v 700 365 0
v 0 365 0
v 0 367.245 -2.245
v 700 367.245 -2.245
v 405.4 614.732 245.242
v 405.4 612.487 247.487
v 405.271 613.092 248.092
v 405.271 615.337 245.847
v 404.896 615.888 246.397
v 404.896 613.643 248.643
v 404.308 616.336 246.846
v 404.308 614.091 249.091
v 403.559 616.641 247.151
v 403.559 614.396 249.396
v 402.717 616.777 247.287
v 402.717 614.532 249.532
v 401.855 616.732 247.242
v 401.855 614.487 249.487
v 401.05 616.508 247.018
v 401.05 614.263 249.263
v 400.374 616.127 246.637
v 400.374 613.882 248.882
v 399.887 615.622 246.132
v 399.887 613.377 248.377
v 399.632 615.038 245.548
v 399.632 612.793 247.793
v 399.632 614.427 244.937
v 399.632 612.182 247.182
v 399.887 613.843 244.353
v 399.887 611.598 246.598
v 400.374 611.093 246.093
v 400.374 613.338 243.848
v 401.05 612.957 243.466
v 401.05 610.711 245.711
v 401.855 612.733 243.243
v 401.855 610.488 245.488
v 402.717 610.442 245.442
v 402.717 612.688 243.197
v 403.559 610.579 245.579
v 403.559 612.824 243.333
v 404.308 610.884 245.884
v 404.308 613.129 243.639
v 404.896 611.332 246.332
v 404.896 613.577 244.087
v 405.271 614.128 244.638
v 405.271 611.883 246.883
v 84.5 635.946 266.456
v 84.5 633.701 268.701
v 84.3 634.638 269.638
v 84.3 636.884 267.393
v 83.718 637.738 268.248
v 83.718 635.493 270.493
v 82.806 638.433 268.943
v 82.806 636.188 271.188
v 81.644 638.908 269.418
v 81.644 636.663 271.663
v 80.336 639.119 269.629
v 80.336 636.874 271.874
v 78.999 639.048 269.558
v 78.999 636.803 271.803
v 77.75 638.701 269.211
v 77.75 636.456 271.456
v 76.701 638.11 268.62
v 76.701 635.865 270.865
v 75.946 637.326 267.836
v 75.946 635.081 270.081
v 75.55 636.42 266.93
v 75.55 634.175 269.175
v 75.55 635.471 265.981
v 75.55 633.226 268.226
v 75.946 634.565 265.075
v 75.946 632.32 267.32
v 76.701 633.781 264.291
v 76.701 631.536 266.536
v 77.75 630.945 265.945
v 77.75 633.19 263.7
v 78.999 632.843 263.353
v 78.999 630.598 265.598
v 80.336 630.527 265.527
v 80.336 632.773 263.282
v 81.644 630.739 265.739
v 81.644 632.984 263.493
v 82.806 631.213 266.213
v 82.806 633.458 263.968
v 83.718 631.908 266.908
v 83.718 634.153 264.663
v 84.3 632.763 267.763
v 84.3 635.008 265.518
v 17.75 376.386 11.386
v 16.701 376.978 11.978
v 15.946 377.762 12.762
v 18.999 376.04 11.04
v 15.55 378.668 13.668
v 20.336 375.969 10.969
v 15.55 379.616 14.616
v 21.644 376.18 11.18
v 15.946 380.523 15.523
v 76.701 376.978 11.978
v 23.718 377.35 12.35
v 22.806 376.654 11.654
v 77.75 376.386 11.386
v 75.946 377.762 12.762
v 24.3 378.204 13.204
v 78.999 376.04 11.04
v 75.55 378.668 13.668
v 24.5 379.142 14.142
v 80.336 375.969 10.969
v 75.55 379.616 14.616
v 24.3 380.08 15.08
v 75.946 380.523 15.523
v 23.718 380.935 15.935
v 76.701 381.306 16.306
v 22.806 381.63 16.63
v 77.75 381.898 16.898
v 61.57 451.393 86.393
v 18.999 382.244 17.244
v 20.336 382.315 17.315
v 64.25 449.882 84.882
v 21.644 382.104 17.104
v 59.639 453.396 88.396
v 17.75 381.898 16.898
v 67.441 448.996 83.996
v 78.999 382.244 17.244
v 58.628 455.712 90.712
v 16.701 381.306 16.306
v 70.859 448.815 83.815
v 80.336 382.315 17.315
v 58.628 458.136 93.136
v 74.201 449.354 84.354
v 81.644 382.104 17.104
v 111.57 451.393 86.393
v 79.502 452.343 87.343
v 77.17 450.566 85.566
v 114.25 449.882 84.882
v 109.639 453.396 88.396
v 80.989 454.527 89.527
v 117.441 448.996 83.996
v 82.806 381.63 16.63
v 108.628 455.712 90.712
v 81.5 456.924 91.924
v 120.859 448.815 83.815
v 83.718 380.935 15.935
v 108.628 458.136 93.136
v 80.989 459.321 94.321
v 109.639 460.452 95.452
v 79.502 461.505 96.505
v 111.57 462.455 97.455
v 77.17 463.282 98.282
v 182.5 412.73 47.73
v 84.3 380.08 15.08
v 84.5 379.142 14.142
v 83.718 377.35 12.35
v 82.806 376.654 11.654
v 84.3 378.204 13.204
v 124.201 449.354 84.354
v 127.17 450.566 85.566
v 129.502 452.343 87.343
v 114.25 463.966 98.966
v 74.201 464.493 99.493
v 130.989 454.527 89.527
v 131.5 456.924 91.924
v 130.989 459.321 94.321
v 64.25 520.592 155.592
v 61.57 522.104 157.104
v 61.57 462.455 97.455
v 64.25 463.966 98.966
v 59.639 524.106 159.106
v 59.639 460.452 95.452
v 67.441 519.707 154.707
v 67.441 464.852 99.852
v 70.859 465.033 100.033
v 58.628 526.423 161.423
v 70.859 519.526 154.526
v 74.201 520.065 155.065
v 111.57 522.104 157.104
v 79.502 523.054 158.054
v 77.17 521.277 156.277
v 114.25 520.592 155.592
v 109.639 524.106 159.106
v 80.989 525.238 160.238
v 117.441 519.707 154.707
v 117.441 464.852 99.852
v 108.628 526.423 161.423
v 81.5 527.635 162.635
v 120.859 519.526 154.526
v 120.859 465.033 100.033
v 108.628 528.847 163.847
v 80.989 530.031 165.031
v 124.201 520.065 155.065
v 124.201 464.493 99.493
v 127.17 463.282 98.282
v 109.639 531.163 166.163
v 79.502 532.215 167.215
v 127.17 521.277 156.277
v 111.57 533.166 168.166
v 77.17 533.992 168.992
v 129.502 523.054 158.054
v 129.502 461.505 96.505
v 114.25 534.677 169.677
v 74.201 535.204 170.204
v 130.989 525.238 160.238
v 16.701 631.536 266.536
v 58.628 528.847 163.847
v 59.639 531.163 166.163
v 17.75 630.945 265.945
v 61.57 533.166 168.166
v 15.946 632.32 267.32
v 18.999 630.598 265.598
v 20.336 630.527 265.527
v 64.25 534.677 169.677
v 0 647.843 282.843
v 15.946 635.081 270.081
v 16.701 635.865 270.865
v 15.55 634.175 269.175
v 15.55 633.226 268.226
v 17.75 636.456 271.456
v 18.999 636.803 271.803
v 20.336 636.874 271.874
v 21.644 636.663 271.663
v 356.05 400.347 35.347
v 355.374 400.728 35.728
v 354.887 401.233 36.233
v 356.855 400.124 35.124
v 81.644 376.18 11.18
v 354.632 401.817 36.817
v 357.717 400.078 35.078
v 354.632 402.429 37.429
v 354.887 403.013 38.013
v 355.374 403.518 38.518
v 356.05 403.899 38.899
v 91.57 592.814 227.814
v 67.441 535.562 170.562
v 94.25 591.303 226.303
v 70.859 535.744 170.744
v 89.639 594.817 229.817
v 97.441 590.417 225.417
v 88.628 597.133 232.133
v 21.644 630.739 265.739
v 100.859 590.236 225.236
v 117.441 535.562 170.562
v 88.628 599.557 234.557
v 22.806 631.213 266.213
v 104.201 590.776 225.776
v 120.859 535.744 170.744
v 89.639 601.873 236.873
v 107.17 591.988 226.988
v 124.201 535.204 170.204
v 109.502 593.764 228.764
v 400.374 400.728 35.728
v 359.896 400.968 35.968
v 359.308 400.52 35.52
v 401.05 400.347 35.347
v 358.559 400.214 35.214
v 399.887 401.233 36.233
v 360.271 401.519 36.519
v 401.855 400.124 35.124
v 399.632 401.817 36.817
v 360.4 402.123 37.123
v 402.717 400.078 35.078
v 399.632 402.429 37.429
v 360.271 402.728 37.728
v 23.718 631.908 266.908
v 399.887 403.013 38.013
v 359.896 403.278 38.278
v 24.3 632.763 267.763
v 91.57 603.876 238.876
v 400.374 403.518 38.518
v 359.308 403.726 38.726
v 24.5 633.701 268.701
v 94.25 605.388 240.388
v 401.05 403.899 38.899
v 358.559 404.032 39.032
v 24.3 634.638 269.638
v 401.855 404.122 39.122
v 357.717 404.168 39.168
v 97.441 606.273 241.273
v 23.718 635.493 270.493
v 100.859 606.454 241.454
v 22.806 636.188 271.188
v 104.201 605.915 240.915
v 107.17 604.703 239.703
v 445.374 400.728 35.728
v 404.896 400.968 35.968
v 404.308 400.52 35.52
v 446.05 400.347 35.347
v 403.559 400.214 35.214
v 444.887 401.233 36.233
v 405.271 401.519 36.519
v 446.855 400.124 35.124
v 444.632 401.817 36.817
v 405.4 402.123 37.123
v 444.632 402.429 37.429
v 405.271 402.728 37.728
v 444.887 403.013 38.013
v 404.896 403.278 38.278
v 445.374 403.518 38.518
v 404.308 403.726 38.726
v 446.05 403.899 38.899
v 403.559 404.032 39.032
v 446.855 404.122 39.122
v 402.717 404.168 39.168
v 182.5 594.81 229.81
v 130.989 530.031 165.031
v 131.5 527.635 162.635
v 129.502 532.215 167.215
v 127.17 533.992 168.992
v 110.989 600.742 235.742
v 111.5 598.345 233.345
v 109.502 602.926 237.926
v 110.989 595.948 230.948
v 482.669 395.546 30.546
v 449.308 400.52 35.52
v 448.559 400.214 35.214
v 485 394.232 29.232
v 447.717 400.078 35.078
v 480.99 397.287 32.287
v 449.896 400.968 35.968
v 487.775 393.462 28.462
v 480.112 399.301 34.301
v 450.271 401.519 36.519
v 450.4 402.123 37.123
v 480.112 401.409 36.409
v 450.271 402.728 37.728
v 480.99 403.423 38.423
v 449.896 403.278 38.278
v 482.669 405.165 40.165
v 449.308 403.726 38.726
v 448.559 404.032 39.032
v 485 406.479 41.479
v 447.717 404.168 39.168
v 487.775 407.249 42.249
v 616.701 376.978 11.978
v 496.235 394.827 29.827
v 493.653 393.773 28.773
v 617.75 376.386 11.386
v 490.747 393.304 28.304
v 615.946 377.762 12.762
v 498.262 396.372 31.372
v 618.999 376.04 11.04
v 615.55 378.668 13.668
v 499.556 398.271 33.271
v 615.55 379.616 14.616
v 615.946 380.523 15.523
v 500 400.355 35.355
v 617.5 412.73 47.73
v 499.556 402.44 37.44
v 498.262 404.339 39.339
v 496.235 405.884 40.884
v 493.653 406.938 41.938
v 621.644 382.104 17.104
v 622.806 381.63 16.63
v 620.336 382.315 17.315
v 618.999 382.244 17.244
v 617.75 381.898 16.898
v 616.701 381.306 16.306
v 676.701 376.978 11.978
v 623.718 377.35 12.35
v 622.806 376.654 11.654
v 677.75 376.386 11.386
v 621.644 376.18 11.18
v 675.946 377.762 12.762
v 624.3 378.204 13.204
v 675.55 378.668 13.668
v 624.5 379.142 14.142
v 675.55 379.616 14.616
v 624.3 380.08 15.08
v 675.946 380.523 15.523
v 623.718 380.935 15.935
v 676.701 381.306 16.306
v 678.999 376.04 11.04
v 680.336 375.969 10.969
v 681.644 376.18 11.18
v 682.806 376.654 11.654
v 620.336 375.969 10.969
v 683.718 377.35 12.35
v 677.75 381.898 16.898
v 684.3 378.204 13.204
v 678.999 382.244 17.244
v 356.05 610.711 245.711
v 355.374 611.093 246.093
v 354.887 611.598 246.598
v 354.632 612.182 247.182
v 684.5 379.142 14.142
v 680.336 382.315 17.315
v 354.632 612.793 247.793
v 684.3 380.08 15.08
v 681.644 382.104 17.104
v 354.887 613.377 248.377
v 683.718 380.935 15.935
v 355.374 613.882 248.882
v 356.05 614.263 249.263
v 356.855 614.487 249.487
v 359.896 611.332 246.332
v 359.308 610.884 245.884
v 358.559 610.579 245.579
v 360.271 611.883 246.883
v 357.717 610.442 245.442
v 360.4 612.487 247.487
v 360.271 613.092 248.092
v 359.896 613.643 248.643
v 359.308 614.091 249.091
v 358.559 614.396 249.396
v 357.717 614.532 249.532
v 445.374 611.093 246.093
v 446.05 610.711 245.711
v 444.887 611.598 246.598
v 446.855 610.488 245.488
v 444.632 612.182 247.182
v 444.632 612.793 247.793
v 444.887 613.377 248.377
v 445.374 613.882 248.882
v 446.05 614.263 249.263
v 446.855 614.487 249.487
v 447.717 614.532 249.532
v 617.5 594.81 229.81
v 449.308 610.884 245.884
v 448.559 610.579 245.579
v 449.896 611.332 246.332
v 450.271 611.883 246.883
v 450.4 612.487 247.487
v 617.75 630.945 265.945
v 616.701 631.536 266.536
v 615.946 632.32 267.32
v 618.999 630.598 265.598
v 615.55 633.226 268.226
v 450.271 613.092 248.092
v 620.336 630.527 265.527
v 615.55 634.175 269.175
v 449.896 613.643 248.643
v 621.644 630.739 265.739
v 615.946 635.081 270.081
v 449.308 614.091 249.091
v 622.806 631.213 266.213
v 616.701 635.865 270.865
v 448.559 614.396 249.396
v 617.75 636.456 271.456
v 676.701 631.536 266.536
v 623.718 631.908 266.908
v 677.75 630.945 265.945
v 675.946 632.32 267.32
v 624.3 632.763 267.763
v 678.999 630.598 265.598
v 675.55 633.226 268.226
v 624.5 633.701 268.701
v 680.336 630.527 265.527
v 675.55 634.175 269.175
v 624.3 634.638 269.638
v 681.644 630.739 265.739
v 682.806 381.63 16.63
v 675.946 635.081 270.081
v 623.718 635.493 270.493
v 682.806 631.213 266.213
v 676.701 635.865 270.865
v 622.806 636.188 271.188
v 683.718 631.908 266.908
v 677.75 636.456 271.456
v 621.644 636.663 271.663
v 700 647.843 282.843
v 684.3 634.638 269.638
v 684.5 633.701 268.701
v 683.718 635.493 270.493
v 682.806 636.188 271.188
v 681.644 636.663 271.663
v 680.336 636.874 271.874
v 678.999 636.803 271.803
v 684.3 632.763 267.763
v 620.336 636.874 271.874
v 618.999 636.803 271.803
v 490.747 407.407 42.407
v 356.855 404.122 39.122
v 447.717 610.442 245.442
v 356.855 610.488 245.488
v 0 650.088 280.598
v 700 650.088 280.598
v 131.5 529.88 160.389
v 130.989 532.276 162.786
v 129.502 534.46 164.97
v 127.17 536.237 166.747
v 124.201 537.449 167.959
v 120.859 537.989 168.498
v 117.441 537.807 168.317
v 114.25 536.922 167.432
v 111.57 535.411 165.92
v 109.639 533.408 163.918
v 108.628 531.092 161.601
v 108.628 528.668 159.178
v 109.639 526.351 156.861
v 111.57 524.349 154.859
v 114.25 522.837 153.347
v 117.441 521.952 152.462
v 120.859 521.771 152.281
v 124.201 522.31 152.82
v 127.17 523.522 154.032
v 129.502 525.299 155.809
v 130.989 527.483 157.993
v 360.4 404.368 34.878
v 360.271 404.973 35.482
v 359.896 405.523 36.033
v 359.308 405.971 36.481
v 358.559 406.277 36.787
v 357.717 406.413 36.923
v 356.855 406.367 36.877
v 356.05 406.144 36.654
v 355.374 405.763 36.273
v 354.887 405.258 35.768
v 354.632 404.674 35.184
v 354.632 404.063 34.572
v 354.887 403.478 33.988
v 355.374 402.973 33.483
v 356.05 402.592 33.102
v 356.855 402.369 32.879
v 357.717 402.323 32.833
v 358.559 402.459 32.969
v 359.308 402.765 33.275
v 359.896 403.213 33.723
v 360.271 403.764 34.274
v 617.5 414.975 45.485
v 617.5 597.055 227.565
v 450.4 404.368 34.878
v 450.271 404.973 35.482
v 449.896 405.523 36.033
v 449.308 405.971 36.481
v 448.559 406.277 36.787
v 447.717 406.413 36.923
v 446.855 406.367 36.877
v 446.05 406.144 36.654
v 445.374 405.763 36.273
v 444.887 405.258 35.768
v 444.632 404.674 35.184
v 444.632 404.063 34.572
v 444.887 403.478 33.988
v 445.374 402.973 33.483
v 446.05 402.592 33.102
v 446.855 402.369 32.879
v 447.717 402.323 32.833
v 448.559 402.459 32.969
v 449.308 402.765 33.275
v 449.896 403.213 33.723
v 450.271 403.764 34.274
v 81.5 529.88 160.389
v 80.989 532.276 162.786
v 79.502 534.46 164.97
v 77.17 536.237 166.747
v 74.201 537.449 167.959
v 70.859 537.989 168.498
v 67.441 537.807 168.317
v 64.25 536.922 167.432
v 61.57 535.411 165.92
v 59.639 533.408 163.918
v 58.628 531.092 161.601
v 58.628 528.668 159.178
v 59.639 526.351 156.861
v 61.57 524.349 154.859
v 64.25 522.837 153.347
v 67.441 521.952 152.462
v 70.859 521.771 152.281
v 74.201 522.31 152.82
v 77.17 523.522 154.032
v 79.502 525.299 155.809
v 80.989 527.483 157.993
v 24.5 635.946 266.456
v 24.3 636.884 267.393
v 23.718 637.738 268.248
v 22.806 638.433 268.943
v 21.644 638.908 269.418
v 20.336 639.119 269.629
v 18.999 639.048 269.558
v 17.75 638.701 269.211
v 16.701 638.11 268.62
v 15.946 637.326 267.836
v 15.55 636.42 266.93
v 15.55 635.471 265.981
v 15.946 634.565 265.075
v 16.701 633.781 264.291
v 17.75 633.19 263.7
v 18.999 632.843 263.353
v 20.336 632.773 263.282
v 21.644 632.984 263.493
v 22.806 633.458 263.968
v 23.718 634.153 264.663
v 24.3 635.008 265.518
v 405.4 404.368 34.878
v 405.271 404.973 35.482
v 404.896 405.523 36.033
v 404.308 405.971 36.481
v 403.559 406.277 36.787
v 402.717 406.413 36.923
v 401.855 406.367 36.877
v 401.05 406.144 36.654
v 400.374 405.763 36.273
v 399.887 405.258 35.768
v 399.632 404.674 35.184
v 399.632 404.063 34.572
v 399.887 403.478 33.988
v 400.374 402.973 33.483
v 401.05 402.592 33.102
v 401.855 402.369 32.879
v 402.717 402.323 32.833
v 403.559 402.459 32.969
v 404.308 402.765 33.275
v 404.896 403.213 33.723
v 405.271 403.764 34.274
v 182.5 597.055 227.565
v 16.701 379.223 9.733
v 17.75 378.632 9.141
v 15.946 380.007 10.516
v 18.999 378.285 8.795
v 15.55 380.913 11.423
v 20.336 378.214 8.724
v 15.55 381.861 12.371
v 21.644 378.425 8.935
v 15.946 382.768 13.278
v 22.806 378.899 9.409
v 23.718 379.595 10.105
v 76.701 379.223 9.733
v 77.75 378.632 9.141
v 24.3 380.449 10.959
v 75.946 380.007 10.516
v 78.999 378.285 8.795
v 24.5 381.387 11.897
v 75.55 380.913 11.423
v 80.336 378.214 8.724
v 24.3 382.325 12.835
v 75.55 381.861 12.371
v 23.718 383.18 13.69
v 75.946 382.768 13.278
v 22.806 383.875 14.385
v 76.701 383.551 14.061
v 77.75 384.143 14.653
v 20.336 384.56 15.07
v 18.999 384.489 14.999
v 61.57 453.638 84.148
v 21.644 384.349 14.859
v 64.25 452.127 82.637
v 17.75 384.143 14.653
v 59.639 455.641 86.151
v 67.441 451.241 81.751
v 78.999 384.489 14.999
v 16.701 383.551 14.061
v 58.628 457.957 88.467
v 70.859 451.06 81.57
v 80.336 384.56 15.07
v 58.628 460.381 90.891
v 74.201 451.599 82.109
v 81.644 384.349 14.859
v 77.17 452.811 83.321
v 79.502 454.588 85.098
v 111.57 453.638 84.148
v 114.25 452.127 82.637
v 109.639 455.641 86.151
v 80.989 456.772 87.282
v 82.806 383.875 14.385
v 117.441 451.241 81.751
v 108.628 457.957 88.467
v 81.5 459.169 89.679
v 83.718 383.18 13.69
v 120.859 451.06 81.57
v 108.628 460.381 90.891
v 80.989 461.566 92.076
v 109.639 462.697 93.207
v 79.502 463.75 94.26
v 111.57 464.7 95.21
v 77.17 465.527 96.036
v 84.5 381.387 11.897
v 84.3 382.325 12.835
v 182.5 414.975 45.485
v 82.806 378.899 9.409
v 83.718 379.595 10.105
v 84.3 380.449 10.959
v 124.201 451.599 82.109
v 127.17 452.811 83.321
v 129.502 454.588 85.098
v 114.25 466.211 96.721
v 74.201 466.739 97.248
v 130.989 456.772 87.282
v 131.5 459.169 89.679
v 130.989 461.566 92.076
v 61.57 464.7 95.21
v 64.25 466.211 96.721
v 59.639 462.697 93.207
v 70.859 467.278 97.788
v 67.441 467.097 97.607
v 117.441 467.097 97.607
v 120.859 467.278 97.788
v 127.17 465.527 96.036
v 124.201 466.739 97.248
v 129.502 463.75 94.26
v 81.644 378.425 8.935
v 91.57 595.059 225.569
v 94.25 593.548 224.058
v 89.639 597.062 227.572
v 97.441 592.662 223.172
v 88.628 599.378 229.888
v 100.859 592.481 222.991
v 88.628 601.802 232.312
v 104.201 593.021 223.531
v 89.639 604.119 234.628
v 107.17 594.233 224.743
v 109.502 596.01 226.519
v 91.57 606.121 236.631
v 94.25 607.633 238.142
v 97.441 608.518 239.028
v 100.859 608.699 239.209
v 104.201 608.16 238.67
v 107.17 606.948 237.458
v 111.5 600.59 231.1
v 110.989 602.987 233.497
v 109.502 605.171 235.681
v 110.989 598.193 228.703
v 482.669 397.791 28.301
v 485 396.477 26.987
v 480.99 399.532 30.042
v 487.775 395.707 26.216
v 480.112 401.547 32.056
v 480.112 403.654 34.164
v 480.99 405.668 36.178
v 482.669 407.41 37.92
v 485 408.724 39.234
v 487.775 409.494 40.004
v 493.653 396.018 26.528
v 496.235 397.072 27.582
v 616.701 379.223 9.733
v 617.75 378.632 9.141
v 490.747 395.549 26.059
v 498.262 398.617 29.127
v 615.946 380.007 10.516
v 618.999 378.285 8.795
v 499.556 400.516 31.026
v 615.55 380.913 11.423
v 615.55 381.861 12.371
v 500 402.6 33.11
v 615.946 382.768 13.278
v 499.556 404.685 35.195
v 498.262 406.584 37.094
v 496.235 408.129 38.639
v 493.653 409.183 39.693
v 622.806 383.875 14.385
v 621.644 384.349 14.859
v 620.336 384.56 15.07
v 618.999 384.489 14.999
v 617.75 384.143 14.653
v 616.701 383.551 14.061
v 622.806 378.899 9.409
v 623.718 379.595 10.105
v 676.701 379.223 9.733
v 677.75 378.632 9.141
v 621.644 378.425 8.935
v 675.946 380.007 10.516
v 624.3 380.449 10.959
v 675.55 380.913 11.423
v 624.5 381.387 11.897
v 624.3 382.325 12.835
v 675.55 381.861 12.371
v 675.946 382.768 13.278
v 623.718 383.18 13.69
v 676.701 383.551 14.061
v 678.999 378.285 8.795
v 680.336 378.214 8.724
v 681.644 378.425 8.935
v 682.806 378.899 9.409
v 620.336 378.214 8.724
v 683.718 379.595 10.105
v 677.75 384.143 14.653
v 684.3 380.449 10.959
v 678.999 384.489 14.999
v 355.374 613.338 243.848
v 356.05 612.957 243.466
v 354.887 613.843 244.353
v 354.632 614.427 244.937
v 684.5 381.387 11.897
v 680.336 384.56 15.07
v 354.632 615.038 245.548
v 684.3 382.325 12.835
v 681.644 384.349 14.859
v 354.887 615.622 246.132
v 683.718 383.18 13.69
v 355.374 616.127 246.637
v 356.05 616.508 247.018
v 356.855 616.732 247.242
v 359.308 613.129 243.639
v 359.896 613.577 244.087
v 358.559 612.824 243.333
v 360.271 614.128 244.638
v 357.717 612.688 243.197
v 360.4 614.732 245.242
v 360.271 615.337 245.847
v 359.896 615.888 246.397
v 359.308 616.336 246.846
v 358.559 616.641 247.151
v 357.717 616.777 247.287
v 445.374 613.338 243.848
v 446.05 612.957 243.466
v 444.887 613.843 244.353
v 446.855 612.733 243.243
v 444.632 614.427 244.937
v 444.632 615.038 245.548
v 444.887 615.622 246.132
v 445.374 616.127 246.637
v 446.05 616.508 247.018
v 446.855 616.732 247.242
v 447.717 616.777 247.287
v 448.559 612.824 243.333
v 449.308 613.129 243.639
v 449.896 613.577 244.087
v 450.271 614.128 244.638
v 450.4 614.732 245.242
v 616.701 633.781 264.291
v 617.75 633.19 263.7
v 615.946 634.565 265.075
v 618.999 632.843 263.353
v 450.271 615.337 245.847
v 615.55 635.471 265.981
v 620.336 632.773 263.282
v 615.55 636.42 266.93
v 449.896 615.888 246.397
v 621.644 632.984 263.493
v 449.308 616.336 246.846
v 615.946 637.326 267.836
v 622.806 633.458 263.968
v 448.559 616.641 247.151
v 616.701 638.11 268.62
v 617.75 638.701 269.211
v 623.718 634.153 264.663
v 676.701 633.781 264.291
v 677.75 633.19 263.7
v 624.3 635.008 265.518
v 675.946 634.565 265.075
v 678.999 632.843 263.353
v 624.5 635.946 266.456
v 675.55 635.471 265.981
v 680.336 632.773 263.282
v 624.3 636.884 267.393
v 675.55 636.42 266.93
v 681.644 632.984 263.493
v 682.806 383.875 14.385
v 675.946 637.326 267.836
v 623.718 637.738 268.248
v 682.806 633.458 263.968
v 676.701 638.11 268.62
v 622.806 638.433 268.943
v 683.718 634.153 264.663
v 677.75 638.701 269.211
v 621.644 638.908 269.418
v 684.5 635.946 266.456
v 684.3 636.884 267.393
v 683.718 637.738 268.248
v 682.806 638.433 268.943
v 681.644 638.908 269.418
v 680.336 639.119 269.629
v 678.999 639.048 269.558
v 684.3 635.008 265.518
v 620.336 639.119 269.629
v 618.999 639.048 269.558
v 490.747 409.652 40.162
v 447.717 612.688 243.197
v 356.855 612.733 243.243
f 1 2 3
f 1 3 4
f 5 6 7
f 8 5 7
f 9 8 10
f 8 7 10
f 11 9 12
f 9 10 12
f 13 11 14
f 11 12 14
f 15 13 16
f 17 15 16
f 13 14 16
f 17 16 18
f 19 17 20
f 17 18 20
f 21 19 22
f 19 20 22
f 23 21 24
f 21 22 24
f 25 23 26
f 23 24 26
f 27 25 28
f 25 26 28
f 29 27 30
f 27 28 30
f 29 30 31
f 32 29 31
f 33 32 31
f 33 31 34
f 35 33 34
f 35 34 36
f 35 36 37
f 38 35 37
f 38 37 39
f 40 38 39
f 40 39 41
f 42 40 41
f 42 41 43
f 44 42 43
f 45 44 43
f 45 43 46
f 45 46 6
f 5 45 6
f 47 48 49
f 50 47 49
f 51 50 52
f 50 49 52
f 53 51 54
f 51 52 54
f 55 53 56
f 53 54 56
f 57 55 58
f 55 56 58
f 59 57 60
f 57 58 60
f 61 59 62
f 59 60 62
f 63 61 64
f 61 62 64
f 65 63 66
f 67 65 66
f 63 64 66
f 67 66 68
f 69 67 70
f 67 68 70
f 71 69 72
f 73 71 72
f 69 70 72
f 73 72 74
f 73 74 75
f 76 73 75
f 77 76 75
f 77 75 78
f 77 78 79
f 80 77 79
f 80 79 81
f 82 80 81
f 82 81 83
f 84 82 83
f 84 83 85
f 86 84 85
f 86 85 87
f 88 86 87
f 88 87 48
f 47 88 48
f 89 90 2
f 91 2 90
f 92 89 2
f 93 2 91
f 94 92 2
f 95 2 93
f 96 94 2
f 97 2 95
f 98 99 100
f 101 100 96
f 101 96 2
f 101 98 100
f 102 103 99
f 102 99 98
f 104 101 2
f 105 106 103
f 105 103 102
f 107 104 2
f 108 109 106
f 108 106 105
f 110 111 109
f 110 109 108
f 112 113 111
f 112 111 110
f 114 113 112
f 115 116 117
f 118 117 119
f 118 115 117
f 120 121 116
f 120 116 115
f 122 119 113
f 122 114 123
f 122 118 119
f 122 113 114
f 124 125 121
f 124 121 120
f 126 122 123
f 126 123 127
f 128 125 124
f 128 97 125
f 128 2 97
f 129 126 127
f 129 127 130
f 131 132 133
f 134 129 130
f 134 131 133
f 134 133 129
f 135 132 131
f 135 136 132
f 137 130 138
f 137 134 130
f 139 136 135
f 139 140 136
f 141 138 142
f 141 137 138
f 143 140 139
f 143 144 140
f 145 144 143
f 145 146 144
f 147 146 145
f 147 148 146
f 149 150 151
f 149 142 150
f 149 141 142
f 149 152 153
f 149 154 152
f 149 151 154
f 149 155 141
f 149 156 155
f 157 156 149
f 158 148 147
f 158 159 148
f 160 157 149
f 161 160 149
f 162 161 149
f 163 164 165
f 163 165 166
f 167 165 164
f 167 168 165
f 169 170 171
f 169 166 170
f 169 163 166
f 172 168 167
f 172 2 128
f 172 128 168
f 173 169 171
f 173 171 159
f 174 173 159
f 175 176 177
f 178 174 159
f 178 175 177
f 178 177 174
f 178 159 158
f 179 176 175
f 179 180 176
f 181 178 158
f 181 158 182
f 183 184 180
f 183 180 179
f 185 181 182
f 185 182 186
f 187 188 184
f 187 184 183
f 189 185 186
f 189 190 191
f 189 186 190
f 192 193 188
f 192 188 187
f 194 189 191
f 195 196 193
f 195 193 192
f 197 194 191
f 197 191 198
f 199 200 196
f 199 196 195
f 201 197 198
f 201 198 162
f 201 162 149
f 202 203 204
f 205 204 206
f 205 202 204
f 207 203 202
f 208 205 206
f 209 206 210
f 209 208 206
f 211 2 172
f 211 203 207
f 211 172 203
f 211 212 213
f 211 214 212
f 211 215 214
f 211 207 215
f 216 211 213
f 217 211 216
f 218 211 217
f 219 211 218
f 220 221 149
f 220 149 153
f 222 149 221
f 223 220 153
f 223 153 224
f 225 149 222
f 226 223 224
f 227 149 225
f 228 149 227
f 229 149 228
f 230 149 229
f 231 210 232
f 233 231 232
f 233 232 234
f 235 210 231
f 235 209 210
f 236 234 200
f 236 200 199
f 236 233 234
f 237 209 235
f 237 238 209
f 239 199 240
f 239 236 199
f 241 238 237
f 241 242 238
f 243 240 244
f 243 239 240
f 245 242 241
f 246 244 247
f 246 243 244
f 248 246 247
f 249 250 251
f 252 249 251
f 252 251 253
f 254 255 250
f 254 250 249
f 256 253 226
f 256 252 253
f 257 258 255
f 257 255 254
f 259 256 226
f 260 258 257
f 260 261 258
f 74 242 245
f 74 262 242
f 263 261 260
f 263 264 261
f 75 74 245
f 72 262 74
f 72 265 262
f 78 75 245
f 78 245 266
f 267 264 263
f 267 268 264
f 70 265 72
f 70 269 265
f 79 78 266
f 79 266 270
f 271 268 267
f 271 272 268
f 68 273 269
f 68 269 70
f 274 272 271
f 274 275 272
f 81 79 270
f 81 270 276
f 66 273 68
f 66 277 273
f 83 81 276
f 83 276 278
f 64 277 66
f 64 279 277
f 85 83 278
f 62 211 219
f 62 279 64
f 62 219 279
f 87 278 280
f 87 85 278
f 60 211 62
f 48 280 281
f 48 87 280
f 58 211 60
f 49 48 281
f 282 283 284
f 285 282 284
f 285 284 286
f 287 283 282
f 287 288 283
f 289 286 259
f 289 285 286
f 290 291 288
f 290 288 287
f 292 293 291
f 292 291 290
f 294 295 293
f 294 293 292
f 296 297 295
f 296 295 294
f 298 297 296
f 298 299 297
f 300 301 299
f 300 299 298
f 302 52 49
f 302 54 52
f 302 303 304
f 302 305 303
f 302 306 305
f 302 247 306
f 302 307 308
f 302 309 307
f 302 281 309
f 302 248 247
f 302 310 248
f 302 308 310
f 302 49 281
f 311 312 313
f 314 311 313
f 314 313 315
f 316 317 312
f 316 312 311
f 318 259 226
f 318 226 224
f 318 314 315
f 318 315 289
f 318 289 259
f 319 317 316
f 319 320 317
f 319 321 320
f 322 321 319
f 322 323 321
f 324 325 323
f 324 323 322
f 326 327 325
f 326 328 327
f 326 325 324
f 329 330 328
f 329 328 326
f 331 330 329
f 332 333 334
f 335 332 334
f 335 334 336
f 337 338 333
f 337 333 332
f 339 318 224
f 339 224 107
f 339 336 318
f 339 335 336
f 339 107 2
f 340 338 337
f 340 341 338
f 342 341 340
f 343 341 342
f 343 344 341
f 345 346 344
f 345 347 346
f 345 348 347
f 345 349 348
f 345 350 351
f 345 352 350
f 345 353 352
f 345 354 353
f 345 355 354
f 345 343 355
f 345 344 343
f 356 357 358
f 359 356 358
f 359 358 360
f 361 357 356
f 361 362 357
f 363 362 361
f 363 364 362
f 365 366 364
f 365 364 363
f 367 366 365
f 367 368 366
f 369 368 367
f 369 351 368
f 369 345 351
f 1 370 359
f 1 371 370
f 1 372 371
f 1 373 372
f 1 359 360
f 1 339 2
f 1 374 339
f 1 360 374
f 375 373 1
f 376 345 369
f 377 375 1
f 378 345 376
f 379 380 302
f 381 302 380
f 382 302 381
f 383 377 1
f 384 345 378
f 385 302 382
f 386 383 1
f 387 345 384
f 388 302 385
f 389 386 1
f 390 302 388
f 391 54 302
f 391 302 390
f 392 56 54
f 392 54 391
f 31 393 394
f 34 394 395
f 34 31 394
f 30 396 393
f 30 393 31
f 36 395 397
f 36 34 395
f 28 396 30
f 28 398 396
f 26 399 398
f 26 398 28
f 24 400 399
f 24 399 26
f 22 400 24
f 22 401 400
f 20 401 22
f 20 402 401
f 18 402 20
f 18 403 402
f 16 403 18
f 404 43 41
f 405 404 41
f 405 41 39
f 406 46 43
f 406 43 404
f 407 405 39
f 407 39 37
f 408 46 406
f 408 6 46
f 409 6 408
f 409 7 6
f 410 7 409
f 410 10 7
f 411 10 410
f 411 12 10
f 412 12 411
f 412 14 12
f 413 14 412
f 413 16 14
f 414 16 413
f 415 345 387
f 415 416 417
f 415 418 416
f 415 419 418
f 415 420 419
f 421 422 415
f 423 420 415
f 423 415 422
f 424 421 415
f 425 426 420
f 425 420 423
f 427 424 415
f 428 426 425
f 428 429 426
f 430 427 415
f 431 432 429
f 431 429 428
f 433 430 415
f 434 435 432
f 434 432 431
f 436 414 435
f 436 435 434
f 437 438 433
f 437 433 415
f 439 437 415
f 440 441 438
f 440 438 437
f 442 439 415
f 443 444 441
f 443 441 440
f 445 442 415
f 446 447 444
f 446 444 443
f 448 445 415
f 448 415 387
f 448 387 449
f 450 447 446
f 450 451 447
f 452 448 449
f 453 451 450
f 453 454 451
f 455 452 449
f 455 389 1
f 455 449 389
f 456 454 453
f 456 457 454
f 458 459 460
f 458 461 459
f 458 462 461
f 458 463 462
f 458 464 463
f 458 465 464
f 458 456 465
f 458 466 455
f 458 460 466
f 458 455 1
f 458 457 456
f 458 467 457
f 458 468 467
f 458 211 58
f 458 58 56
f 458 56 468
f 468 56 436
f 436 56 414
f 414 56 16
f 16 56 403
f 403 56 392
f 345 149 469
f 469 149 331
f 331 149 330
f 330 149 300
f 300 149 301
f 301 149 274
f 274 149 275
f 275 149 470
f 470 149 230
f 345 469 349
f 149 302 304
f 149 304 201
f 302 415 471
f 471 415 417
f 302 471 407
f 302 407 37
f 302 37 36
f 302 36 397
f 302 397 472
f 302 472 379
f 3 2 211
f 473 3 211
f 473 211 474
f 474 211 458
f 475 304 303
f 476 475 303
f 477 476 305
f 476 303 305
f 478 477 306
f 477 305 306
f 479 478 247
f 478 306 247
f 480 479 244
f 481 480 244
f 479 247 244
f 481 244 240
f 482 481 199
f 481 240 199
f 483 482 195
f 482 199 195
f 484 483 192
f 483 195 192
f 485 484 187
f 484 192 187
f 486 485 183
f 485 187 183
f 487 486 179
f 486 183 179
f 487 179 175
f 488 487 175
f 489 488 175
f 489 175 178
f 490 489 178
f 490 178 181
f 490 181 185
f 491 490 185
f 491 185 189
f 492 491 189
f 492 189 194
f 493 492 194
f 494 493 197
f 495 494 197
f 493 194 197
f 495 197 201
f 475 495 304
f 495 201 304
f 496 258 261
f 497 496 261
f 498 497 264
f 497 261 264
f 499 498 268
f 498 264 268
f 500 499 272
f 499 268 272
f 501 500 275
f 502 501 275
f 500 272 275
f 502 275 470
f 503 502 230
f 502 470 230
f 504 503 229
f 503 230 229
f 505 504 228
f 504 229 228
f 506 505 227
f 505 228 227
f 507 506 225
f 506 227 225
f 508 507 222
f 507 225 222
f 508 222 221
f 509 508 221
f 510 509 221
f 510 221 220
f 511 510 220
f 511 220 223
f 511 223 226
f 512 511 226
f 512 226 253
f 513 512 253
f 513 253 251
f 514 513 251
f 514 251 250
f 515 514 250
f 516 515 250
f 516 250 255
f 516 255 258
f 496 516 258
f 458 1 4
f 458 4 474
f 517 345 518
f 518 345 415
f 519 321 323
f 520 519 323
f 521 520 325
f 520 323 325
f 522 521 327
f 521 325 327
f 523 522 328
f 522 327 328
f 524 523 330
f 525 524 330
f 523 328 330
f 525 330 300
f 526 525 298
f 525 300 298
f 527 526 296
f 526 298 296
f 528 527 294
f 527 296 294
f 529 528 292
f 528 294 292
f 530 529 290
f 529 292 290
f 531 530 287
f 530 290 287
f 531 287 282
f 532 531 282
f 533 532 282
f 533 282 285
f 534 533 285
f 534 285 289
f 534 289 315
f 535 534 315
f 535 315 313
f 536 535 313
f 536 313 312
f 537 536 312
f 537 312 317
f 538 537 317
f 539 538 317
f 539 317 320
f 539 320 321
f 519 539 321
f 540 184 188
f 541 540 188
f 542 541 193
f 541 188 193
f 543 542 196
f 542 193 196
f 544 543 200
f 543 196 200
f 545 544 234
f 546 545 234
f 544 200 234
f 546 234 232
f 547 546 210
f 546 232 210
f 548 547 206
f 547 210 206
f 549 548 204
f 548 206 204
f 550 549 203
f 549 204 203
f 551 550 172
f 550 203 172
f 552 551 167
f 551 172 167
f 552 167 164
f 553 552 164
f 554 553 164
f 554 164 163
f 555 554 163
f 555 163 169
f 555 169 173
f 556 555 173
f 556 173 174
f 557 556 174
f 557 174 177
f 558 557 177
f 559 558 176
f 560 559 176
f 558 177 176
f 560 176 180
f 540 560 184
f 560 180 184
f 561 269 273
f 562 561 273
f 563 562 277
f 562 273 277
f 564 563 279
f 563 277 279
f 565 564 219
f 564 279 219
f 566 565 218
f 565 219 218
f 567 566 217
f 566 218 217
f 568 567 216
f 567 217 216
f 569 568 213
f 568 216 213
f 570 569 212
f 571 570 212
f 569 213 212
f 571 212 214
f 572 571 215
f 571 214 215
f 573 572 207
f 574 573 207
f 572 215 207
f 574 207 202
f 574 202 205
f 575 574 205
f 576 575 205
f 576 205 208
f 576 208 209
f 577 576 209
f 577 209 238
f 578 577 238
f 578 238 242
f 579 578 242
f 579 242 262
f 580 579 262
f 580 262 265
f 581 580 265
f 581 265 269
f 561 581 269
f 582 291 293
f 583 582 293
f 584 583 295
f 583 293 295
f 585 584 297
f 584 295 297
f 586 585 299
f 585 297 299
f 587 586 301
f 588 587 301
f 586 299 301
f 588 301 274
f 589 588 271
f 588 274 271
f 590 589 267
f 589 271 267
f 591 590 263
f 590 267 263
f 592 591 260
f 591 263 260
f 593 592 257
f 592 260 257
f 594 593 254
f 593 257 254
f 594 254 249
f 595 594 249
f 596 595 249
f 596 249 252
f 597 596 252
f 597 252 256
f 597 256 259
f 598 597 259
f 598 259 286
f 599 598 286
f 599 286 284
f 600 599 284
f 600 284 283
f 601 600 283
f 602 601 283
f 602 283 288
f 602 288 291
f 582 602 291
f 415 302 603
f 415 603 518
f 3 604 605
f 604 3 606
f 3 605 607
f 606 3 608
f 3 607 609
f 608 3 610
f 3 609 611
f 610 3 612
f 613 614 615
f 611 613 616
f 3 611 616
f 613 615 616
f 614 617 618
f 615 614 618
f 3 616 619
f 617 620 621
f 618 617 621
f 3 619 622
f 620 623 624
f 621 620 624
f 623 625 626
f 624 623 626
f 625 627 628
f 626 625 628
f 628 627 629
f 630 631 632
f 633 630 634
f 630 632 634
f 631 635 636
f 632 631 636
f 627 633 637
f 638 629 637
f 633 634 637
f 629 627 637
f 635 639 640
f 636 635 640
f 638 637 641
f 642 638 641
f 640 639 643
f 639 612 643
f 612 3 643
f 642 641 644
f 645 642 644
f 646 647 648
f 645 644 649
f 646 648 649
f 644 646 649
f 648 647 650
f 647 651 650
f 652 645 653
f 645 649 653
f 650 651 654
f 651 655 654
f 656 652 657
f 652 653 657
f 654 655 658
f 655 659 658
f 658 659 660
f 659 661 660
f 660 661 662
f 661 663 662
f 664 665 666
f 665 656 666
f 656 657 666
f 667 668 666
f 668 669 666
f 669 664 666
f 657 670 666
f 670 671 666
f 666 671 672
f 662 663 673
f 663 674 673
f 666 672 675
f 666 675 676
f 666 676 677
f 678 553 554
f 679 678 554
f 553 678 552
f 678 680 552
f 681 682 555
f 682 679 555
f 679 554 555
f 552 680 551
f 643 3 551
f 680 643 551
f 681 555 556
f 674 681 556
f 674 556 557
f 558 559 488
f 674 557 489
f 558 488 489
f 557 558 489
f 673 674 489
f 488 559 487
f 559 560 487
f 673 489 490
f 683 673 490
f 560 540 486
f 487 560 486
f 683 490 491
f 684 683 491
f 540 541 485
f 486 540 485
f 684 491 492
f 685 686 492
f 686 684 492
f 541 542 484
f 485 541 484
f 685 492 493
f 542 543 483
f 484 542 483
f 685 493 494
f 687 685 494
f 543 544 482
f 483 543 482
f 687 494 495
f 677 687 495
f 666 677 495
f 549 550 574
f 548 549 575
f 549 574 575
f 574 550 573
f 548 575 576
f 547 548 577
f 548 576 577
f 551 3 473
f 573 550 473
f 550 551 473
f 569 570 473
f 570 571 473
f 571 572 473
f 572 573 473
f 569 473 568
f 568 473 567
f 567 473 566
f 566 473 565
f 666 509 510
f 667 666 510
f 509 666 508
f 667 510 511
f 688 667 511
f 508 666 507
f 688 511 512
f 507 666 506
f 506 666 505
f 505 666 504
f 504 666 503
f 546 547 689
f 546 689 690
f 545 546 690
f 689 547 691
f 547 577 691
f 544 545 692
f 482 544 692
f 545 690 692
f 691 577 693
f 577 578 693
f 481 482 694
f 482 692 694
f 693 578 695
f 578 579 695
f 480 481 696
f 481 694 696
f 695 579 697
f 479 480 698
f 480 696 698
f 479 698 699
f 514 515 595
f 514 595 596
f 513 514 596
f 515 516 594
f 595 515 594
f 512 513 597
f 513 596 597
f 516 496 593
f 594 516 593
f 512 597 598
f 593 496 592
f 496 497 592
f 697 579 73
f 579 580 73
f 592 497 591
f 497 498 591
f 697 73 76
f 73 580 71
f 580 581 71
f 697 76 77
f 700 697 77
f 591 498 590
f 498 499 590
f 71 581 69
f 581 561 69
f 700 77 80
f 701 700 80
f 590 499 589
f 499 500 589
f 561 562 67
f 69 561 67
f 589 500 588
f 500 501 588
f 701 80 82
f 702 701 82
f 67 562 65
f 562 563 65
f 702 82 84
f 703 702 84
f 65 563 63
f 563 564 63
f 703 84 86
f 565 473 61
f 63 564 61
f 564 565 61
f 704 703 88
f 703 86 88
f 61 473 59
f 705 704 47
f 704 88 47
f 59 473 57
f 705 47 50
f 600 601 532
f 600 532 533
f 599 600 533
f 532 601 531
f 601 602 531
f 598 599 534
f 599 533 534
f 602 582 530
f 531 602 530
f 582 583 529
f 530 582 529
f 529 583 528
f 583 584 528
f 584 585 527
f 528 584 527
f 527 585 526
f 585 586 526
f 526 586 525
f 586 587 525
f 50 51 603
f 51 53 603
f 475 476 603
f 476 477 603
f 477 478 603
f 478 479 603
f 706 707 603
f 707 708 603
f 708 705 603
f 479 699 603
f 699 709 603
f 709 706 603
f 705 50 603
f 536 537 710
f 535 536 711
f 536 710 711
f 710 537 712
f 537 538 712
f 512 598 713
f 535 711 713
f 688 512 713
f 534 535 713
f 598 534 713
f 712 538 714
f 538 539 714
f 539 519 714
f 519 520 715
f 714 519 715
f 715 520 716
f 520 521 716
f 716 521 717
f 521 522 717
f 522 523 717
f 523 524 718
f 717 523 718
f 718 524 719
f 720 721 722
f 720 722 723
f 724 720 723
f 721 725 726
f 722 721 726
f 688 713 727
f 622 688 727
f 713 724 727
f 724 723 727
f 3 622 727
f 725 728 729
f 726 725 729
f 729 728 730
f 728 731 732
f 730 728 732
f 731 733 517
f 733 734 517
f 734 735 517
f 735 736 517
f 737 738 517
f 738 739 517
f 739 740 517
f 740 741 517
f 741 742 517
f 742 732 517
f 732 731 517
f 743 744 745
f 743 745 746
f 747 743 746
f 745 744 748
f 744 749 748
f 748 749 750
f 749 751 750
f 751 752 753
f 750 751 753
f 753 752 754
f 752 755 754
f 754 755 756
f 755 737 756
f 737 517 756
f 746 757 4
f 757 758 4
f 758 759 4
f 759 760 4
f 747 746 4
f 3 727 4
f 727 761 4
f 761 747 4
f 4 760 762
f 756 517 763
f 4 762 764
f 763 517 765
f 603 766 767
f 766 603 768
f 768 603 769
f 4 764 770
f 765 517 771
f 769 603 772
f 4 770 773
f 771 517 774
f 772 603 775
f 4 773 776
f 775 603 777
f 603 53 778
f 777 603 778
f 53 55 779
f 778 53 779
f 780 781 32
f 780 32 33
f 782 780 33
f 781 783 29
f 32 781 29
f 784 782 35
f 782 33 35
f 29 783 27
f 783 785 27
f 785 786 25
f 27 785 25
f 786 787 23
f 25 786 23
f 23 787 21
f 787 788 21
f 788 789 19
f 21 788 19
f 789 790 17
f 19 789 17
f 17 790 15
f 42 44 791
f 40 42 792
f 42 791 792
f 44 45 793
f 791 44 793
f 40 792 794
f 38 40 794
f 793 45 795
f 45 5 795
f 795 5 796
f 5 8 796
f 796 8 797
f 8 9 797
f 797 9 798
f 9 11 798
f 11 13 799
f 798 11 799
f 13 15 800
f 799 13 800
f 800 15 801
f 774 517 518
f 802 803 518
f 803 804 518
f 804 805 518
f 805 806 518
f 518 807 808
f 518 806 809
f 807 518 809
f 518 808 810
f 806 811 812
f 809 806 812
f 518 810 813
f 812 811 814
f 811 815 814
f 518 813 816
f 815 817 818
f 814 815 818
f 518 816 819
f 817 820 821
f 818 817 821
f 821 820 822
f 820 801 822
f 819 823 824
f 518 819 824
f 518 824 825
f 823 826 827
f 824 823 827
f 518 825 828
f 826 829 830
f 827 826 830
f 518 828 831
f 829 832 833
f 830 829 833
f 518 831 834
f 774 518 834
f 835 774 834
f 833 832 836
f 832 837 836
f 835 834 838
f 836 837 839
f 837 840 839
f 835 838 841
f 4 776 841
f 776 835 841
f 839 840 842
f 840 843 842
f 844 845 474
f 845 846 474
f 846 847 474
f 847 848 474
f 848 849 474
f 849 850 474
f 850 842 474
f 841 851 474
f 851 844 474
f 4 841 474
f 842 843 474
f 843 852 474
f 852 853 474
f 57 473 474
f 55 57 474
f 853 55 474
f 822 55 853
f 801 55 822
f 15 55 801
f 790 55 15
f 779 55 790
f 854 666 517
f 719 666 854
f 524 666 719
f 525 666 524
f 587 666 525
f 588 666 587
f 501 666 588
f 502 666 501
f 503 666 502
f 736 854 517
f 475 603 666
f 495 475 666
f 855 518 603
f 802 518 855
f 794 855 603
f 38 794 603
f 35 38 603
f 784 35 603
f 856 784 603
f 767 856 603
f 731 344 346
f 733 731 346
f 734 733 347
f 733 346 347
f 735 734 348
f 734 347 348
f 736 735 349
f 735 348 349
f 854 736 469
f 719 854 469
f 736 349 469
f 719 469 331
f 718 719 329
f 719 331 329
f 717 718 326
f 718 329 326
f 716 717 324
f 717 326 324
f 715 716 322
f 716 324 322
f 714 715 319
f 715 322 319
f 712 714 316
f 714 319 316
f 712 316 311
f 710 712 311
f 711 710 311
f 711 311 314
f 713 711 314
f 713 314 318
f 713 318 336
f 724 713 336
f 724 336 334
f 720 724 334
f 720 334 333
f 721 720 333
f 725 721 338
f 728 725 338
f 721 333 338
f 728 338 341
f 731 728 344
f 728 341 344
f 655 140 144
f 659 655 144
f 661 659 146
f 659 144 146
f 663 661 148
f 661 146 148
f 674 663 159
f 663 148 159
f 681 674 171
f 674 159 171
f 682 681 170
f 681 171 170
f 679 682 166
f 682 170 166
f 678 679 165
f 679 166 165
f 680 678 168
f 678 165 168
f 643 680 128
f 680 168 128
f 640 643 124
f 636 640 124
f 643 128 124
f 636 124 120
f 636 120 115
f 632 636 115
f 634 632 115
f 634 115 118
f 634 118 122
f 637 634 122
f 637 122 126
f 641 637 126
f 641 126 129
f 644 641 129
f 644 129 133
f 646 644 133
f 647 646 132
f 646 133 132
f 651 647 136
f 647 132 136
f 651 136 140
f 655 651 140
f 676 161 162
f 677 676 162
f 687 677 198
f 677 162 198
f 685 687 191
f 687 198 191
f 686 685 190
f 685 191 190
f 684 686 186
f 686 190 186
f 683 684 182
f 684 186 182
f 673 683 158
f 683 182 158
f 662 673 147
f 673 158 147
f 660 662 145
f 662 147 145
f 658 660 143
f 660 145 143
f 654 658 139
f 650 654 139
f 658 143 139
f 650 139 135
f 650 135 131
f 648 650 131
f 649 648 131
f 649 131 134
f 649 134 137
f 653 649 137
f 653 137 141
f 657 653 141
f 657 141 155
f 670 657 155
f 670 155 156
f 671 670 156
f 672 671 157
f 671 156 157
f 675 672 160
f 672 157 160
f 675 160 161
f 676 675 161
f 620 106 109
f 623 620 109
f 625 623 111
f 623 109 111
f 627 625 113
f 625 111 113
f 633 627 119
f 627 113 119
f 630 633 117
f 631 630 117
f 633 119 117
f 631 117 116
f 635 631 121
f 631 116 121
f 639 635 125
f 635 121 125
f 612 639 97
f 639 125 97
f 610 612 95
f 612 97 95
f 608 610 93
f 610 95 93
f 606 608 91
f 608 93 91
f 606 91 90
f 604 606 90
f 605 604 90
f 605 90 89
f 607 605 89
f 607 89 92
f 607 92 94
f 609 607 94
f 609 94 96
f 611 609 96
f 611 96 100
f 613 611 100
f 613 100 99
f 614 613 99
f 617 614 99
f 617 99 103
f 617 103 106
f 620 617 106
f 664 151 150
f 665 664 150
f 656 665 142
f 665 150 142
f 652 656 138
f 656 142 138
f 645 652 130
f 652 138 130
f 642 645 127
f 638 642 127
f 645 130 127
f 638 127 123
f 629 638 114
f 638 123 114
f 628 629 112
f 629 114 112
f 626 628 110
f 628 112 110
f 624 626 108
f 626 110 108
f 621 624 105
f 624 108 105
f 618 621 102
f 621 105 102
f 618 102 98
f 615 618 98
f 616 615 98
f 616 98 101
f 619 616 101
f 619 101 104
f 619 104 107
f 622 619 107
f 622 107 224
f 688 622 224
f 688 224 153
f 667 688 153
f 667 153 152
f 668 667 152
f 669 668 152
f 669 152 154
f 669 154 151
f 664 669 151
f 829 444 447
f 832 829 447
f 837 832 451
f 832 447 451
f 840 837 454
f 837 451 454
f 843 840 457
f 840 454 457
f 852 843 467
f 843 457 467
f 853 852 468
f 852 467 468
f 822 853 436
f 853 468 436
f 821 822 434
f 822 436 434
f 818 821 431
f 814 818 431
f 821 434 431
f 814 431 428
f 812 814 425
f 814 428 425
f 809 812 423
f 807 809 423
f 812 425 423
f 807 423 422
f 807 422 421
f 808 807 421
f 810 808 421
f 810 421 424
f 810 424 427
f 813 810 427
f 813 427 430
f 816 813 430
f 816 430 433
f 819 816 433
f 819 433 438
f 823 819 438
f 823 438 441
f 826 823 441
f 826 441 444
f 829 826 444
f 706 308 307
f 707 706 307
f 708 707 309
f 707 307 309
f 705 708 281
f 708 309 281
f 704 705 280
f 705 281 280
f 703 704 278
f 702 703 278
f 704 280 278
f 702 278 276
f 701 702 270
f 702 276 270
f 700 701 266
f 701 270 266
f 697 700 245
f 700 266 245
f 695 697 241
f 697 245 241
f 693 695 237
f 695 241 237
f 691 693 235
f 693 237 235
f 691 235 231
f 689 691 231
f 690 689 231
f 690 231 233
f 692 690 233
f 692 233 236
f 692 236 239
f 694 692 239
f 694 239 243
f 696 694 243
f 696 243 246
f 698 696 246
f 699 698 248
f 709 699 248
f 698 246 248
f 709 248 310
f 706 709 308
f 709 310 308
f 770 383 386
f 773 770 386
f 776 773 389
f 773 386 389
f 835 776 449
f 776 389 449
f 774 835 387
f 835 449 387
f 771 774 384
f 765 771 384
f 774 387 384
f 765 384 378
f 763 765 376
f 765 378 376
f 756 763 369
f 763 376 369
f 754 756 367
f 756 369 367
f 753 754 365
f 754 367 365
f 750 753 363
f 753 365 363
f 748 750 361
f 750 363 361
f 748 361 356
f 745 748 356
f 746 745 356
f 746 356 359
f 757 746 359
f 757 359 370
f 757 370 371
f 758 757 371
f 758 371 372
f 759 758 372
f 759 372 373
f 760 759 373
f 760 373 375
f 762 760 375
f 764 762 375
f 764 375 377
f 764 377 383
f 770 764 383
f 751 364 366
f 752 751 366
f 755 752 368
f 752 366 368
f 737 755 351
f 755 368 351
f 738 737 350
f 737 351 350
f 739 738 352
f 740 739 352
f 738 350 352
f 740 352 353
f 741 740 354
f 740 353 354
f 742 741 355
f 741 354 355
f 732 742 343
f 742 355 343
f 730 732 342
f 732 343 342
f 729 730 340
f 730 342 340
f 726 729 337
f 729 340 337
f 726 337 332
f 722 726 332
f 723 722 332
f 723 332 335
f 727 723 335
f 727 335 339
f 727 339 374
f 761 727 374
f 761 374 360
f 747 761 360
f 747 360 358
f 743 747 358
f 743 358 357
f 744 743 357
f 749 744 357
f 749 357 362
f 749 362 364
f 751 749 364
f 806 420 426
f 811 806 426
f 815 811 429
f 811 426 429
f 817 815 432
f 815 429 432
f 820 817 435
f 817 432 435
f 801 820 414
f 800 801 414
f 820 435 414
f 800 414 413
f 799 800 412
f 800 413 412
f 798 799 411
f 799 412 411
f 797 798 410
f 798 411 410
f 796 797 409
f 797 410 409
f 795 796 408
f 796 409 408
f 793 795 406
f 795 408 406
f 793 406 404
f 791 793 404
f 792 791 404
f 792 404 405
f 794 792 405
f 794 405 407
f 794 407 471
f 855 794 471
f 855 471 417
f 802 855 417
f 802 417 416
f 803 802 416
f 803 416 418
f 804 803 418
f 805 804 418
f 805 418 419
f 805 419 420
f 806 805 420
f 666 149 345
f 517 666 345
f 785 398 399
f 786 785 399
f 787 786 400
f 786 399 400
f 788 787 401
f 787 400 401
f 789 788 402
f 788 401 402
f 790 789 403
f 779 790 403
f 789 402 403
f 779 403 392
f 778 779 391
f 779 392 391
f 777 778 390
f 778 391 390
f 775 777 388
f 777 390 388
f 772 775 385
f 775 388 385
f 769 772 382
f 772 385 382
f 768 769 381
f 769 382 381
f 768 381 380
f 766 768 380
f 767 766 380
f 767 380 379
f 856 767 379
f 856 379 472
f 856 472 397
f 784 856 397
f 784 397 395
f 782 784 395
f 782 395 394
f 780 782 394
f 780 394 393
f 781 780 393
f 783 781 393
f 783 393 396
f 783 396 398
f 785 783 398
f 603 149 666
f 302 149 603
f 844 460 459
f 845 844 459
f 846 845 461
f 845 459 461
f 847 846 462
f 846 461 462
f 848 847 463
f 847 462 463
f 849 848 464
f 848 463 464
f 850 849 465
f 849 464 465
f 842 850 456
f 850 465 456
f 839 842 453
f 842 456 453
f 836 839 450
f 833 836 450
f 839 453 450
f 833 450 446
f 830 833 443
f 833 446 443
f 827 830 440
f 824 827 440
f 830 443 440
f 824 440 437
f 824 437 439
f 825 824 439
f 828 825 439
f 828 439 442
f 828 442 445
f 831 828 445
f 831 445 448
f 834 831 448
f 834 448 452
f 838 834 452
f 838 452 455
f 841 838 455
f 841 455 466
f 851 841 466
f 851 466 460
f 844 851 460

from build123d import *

# Parameters (mm, degrees)
SKETCH034_W          = 700
SKETCH034_H          = 400
SKETCH034_R          = 11.5
SKETCH034_R_2        = 10
SKETCH034_W_2        = 435
SKETCH034_H_2        = 257.5
PAD001_DEPTH         = 3.175
SKETCH044_R          = 2.9
HOLE005_DEPTH        = 25
SKETCH045_R          = 4.5
HOLE006_DEPTH        = 25
BODY_PLACEMENT_ANGLE = 315


with BuildPart() as part:
    # Sketch034 → Pad001 (new body)
    with BuildSketch(Plane.XY):
        with Locations((350, 200)):
            Rectangle(SKETCH034_W, SKETCH034_H)
        with Locations((120, 230)):
            Circle(SKETCH034_R, mode=Mode.SUBTRACT)
        with Locations((100, 330)):
            Circle(SKETCH034_R, mode=Mode.SUBTRACT)
        with Locations((120, 130)):
            Circle(SKETCH034_R, mode=Mode.SUBTRACT)
        with Locations((70, 230)):
            Circle(SKETCH034_R, mode=Mode.SUBTRACT)
        with Locations((490, 50)):
            Circle(SKETCH034_R_2, mode=Mode.SUBTRACT)
        with Locations((70, 130)):
            Circle(SKETCH034_R, mode=Mode.SUBTRACT)
        with Locations((400, 196.25)):
            Rectangle(SKETCH034_W_2, SKETCH034_H_2, mode=Mode.SUBTRACT)
    extrude(amount=-PAD001_DEPTH)

    # Sketch044 → Hole005 (cut)
    with BuildSketch(Plane.XY):
        with Locations((357.5, 350)):
            Circle(SKETCH044_R)
        with Locations((402.5, 350)):
            Circle(SKETCH044_R)
        with Locations((447.5, 350)):
            Circle(SKETCH044_R)
        with Locations((357.5, 52.5)):
            Circle(SKETCH044_R)
        with Locations((402.5, 52.5)):
            Circle(SKETCH044_R)
        with Locations((447.5, 52.5)):
            Circle(SKETCH044_R)
    extrude(amount=-HOLE005_DEPTH, mode=Mode.SUBTRACT)

    # Sketch045 → Hole006 (cut)
    with BuildSketch(Plane.XY):
        with Locations((20, 20)):
            Circle(SKETCH045_R)
        with Locations((680, 20)):
            Circle(SKETCH045_R)
        with Locations((680, 380)):
            Circle(SKETCH045_R)
        with Locations((20, 380)):
            Circle(SKETCH045_R)
        with Locations((80, 20)):
            Circle(SKETCH045_R)
        with Locations((80, 380)):
            Circle(SKETCH045_R)
        with Locations((620, 20)):
            Circle(SKETCH045_R)
        with Locations((620, 380)):
            Circle(SKETCH045_R)
    extrude(amount=-HOLE006_DEPTH, mode=Mode.SUBTRACT)


with BuildPart() as part_1:
    # Body placement: moved
    add(part.part.moved(Location((0, 365, 0))).rotate(Axis((0, 365, 0), (-1, 0, 0)), BODY_PLACEMENT_ANGLE))


solid = part_1.part
